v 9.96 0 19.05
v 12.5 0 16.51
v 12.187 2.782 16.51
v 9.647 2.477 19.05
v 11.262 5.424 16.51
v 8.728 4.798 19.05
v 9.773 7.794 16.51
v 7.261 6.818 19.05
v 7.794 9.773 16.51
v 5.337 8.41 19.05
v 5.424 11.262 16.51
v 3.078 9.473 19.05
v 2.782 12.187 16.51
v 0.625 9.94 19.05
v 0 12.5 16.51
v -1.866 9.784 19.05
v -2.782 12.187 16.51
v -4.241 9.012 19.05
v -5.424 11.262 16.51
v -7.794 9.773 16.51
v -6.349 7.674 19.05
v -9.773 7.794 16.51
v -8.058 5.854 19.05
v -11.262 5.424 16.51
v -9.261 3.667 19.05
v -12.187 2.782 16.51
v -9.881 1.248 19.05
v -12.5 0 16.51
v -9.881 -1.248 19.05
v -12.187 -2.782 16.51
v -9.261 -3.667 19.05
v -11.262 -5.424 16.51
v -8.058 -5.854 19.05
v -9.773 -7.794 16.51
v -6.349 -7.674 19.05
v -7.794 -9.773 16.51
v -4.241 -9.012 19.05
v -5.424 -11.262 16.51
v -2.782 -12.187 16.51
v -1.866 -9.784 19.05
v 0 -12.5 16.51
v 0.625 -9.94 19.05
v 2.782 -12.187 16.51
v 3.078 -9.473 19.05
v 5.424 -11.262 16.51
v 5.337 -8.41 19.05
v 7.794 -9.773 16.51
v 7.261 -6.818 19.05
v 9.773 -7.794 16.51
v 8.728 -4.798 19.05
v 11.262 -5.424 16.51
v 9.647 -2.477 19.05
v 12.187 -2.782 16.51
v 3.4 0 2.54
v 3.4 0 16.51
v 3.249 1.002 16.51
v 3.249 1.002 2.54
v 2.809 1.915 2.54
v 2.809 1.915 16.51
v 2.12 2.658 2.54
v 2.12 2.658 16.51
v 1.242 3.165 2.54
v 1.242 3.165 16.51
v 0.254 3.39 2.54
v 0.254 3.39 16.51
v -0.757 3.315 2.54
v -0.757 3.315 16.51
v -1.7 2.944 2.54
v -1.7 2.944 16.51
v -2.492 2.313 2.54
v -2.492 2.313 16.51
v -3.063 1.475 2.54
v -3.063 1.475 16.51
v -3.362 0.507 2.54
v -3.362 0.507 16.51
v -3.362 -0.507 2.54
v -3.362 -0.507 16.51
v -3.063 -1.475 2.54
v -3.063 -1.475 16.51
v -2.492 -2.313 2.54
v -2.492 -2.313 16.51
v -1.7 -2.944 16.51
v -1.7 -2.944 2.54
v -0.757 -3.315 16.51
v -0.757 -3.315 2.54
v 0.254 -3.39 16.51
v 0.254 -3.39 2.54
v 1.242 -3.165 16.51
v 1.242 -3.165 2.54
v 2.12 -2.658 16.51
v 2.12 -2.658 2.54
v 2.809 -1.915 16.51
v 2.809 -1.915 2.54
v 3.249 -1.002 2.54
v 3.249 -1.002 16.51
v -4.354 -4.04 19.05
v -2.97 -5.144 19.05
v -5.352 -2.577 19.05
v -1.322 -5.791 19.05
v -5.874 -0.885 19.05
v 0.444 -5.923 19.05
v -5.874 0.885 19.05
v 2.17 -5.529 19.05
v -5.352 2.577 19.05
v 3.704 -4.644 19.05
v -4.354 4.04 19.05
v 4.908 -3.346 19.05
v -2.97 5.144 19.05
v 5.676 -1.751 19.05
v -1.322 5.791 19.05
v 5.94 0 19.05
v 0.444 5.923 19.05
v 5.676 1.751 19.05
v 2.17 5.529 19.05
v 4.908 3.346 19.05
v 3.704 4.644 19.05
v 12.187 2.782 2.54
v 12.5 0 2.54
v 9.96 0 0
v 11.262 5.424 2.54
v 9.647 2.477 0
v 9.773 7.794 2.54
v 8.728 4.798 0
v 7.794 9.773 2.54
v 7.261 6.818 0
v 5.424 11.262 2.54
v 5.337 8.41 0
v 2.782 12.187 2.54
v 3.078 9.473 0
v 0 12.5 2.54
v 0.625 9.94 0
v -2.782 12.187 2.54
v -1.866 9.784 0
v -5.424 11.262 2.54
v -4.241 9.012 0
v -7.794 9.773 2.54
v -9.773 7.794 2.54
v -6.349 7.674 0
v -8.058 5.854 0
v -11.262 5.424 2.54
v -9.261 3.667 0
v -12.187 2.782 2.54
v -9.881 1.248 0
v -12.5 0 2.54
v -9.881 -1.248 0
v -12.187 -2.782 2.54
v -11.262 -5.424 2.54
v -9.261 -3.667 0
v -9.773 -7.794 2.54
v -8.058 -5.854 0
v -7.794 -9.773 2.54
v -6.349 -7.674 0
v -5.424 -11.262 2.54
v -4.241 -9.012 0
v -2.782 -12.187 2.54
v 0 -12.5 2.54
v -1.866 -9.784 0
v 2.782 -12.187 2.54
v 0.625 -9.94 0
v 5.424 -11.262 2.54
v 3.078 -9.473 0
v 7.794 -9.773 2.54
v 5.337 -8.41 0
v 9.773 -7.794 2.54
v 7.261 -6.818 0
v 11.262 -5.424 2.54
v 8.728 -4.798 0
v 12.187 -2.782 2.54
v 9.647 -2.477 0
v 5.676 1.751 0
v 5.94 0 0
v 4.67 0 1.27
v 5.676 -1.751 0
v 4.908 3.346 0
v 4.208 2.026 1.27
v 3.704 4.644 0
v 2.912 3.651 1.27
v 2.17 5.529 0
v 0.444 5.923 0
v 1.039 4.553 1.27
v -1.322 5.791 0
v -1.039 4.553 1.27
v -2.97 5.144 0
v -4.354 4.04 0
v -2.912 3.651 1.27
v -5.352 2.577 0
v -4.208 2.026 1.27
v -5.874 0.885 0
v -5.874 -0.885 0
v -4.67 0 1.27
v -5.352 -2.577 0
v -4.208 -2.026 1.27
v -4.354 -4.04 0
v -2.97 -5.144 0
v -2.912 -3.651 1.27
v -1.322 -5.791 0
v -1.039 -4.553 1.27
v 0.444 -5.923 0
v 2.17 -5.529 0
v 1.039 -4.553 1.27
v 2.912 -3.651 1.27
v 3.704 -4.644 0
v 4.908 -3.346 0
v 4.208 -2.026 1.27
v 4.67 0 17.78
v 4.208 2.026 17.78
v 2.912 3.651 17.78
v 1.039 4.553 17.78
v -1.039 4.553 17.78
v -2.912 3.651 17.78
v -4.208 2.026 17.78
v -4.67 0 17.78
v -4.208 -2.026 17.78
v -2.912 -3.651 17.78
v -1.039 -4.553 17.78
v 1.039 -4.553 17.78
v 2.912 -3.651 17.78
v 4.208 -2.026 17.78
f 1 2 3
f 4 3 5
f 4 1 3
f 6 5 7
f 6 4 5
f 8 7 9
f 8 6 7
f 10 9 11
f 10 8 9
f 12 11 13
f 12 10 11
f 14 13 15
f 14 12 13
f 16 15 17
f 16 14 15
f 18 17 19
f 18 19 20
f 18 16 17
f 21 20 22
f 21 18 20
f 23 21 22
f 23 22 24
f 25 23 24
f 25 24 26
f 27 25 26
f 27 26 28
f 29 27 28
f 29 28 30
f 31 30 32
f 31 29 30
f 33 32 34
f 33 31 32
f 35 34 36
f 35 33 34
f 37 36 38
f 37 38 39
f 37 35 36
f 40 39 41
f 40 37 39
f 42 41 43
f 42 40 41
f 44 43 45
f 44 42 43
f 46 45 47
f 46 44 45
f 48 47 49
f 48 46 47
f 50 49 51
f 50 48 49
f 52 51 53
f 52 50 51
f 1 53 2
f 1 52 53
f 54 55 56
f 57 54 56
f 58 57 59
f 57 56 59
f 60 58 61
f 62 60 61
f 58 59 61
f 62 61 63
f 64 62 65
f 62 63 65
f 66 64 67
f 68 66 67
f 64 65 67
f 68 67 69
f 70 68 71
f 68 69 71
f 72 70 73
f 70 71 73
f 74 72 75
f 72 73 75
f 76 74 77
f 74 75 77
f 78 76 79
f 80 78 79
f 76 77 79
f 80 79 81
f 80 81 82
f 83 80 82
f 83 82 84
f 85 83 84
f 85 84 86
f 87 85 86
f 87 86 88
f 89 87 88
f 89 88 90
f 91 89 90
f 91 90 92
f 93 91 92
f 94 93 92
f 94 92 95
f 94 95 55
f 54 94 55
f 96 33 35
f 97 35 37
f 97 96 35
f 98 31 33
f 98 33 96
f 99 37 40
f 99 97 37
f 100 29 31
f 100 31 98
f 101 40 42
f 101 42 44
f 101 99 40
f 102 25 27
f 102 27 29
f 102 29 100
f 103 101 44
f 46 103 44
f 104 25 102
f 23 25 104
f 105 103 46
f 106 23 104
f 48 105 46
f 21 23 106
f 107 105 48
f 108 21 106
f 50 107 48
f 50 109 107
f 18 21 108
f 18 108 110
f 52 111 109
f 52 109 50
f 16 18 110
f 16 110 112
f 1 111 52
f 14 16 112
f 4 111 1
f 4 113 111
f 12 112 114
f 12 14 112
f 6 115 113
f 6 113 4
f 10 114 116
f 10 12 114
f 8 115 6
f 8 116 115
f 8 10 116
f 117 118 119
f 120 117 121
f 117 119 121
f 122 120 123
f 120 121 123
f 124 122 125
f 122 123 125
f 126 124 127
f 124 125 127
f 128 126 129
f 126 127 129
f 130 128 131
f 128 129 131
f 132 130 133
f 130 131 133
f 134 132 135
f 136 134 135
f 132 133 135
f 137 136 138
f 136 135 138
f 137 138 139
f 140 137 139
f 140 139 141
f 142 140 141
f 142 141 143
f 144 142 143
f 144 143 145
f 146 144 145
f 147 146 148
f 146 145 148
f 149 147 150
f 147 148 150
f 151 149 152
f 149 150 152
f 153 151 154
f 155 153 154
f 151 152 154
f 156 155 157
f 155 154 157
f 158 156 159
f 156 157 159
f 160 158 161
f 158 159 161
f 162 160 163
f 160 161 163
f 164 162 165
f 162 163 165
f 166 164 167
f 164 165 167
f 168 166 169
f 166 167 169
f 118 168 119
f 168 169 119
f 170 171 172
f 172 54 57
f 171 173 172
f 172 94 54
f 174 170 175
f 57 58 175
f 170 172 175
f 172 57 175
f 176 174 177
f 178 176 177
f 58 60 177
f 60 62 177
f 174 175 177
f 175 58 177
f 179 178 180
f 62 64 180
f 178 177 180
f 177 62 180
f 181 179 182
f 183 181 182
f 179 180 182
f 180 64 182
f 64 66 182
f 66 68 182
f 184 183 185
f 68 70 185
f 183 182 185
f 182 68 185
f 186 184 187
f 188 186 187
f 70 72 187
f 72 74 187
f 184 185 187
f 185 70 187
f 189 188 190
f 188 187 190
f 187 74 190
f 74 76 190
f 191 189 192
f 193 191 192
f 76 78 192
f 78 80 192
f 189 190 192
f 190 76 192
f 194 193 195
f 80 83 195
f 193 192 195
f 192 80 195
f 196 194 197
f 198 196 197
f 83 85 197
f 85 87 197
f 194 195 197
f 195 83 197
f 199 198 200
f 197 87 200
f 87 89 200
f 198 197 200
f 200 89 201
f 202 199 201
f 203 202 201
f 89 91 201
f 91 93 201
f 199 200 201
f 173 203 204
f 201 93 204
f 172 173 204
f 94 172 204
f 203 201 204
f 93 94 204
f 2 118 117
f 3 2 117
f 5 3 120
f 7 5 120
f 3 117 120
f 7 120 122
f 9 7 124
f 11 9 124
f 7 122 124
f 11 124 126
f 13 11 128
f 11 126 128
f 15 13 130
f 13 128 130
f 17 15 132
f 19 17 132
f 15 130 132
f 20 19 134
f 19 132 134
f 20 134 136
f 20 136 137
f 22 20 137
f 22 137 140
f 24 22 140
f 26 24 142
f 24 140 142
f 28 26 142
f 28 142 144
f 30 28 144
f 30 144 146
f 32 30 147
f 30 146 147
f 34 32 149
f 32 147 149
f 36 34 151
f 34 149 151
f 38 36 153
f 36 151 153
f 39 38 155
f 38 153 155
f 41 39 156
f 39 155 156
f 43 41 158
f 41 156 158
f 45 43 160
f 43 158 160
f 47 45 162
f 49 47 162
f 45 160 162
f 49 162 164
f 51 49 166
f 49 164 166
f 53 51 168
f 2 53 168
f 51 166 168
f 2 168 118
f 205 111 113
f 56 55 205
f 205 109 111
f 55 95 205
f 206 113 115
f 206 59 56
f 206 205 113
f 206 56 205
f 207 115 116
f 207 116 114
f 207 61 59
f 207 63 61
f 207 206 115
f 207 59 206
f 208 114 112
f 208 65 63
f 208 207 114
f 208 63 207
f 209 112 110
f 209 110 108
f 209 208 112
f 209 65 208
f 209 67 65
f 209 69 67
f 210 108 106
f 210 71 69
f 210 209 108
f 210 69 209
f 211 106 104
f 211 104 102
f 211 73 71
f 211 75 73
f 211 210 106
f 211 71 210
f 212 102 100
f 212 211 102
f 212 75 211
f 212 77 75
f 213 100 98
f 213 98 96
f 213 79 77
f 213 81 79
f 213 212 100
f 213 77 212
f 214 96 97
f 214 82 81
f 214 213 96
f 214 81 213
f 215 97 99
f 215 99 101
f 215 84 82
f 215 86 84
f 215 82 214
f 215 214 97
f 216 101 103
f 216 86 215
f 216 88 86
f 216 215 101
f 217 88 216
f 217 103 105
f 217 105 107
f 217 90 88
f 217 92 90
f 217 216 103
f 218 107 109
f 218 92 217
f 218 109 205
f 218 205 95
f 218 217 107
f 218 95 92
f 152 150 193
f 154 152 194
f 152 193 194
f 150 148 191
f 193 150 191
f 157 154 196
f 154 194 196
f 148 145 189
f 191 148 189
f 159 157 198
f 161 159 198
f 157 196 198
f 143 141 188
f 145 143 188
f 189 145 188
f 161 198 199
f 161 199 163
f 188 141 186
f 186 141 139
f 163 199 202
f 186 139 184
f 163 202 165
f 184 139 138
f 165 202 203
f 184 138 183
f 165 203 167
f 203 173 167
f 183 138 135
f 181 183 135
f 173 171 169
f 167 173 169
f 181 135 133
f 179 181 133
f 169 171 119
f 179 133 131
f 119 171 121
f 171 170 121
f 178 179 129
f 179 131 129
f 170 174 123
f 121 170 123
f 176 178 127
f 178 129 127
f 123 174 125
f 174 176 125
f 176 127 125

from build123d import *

# Parameters (mm, degrees)
F0_R     = 12.5
F1_DEPTH = 19.05
F2_R     = 3.4
F3_DEPTH = 25.4
F4_SIZE  = 2.54


with BuildPart() as f1:
    # F0 (on Top) → F1 (new body)
    with BuildSketch(Plane.XY):
        Circle(F0_R)
    extrude(amount=F1_DEPTH)

    # F2 (on face) → F3 (cut)
    with BuildSketch(Plane.XY.offset(19.05)):
        Circle(F2_R)
    extrude(amount=-F3_DEPTH, mode=Mode.SUBTRACT)

    # F4
    f4_edges = [f1.edges().sort_by_distance(p)[0] for p in [
        (-3.4, 0, 19.05),
        (-3.4, 0, 0),
        (-12.5, 0, 0),
        (-12.5, 0, 19.05),
    ]]
    chamfer(f4_edges, length=F4_SIZE)


solid = f1.part
